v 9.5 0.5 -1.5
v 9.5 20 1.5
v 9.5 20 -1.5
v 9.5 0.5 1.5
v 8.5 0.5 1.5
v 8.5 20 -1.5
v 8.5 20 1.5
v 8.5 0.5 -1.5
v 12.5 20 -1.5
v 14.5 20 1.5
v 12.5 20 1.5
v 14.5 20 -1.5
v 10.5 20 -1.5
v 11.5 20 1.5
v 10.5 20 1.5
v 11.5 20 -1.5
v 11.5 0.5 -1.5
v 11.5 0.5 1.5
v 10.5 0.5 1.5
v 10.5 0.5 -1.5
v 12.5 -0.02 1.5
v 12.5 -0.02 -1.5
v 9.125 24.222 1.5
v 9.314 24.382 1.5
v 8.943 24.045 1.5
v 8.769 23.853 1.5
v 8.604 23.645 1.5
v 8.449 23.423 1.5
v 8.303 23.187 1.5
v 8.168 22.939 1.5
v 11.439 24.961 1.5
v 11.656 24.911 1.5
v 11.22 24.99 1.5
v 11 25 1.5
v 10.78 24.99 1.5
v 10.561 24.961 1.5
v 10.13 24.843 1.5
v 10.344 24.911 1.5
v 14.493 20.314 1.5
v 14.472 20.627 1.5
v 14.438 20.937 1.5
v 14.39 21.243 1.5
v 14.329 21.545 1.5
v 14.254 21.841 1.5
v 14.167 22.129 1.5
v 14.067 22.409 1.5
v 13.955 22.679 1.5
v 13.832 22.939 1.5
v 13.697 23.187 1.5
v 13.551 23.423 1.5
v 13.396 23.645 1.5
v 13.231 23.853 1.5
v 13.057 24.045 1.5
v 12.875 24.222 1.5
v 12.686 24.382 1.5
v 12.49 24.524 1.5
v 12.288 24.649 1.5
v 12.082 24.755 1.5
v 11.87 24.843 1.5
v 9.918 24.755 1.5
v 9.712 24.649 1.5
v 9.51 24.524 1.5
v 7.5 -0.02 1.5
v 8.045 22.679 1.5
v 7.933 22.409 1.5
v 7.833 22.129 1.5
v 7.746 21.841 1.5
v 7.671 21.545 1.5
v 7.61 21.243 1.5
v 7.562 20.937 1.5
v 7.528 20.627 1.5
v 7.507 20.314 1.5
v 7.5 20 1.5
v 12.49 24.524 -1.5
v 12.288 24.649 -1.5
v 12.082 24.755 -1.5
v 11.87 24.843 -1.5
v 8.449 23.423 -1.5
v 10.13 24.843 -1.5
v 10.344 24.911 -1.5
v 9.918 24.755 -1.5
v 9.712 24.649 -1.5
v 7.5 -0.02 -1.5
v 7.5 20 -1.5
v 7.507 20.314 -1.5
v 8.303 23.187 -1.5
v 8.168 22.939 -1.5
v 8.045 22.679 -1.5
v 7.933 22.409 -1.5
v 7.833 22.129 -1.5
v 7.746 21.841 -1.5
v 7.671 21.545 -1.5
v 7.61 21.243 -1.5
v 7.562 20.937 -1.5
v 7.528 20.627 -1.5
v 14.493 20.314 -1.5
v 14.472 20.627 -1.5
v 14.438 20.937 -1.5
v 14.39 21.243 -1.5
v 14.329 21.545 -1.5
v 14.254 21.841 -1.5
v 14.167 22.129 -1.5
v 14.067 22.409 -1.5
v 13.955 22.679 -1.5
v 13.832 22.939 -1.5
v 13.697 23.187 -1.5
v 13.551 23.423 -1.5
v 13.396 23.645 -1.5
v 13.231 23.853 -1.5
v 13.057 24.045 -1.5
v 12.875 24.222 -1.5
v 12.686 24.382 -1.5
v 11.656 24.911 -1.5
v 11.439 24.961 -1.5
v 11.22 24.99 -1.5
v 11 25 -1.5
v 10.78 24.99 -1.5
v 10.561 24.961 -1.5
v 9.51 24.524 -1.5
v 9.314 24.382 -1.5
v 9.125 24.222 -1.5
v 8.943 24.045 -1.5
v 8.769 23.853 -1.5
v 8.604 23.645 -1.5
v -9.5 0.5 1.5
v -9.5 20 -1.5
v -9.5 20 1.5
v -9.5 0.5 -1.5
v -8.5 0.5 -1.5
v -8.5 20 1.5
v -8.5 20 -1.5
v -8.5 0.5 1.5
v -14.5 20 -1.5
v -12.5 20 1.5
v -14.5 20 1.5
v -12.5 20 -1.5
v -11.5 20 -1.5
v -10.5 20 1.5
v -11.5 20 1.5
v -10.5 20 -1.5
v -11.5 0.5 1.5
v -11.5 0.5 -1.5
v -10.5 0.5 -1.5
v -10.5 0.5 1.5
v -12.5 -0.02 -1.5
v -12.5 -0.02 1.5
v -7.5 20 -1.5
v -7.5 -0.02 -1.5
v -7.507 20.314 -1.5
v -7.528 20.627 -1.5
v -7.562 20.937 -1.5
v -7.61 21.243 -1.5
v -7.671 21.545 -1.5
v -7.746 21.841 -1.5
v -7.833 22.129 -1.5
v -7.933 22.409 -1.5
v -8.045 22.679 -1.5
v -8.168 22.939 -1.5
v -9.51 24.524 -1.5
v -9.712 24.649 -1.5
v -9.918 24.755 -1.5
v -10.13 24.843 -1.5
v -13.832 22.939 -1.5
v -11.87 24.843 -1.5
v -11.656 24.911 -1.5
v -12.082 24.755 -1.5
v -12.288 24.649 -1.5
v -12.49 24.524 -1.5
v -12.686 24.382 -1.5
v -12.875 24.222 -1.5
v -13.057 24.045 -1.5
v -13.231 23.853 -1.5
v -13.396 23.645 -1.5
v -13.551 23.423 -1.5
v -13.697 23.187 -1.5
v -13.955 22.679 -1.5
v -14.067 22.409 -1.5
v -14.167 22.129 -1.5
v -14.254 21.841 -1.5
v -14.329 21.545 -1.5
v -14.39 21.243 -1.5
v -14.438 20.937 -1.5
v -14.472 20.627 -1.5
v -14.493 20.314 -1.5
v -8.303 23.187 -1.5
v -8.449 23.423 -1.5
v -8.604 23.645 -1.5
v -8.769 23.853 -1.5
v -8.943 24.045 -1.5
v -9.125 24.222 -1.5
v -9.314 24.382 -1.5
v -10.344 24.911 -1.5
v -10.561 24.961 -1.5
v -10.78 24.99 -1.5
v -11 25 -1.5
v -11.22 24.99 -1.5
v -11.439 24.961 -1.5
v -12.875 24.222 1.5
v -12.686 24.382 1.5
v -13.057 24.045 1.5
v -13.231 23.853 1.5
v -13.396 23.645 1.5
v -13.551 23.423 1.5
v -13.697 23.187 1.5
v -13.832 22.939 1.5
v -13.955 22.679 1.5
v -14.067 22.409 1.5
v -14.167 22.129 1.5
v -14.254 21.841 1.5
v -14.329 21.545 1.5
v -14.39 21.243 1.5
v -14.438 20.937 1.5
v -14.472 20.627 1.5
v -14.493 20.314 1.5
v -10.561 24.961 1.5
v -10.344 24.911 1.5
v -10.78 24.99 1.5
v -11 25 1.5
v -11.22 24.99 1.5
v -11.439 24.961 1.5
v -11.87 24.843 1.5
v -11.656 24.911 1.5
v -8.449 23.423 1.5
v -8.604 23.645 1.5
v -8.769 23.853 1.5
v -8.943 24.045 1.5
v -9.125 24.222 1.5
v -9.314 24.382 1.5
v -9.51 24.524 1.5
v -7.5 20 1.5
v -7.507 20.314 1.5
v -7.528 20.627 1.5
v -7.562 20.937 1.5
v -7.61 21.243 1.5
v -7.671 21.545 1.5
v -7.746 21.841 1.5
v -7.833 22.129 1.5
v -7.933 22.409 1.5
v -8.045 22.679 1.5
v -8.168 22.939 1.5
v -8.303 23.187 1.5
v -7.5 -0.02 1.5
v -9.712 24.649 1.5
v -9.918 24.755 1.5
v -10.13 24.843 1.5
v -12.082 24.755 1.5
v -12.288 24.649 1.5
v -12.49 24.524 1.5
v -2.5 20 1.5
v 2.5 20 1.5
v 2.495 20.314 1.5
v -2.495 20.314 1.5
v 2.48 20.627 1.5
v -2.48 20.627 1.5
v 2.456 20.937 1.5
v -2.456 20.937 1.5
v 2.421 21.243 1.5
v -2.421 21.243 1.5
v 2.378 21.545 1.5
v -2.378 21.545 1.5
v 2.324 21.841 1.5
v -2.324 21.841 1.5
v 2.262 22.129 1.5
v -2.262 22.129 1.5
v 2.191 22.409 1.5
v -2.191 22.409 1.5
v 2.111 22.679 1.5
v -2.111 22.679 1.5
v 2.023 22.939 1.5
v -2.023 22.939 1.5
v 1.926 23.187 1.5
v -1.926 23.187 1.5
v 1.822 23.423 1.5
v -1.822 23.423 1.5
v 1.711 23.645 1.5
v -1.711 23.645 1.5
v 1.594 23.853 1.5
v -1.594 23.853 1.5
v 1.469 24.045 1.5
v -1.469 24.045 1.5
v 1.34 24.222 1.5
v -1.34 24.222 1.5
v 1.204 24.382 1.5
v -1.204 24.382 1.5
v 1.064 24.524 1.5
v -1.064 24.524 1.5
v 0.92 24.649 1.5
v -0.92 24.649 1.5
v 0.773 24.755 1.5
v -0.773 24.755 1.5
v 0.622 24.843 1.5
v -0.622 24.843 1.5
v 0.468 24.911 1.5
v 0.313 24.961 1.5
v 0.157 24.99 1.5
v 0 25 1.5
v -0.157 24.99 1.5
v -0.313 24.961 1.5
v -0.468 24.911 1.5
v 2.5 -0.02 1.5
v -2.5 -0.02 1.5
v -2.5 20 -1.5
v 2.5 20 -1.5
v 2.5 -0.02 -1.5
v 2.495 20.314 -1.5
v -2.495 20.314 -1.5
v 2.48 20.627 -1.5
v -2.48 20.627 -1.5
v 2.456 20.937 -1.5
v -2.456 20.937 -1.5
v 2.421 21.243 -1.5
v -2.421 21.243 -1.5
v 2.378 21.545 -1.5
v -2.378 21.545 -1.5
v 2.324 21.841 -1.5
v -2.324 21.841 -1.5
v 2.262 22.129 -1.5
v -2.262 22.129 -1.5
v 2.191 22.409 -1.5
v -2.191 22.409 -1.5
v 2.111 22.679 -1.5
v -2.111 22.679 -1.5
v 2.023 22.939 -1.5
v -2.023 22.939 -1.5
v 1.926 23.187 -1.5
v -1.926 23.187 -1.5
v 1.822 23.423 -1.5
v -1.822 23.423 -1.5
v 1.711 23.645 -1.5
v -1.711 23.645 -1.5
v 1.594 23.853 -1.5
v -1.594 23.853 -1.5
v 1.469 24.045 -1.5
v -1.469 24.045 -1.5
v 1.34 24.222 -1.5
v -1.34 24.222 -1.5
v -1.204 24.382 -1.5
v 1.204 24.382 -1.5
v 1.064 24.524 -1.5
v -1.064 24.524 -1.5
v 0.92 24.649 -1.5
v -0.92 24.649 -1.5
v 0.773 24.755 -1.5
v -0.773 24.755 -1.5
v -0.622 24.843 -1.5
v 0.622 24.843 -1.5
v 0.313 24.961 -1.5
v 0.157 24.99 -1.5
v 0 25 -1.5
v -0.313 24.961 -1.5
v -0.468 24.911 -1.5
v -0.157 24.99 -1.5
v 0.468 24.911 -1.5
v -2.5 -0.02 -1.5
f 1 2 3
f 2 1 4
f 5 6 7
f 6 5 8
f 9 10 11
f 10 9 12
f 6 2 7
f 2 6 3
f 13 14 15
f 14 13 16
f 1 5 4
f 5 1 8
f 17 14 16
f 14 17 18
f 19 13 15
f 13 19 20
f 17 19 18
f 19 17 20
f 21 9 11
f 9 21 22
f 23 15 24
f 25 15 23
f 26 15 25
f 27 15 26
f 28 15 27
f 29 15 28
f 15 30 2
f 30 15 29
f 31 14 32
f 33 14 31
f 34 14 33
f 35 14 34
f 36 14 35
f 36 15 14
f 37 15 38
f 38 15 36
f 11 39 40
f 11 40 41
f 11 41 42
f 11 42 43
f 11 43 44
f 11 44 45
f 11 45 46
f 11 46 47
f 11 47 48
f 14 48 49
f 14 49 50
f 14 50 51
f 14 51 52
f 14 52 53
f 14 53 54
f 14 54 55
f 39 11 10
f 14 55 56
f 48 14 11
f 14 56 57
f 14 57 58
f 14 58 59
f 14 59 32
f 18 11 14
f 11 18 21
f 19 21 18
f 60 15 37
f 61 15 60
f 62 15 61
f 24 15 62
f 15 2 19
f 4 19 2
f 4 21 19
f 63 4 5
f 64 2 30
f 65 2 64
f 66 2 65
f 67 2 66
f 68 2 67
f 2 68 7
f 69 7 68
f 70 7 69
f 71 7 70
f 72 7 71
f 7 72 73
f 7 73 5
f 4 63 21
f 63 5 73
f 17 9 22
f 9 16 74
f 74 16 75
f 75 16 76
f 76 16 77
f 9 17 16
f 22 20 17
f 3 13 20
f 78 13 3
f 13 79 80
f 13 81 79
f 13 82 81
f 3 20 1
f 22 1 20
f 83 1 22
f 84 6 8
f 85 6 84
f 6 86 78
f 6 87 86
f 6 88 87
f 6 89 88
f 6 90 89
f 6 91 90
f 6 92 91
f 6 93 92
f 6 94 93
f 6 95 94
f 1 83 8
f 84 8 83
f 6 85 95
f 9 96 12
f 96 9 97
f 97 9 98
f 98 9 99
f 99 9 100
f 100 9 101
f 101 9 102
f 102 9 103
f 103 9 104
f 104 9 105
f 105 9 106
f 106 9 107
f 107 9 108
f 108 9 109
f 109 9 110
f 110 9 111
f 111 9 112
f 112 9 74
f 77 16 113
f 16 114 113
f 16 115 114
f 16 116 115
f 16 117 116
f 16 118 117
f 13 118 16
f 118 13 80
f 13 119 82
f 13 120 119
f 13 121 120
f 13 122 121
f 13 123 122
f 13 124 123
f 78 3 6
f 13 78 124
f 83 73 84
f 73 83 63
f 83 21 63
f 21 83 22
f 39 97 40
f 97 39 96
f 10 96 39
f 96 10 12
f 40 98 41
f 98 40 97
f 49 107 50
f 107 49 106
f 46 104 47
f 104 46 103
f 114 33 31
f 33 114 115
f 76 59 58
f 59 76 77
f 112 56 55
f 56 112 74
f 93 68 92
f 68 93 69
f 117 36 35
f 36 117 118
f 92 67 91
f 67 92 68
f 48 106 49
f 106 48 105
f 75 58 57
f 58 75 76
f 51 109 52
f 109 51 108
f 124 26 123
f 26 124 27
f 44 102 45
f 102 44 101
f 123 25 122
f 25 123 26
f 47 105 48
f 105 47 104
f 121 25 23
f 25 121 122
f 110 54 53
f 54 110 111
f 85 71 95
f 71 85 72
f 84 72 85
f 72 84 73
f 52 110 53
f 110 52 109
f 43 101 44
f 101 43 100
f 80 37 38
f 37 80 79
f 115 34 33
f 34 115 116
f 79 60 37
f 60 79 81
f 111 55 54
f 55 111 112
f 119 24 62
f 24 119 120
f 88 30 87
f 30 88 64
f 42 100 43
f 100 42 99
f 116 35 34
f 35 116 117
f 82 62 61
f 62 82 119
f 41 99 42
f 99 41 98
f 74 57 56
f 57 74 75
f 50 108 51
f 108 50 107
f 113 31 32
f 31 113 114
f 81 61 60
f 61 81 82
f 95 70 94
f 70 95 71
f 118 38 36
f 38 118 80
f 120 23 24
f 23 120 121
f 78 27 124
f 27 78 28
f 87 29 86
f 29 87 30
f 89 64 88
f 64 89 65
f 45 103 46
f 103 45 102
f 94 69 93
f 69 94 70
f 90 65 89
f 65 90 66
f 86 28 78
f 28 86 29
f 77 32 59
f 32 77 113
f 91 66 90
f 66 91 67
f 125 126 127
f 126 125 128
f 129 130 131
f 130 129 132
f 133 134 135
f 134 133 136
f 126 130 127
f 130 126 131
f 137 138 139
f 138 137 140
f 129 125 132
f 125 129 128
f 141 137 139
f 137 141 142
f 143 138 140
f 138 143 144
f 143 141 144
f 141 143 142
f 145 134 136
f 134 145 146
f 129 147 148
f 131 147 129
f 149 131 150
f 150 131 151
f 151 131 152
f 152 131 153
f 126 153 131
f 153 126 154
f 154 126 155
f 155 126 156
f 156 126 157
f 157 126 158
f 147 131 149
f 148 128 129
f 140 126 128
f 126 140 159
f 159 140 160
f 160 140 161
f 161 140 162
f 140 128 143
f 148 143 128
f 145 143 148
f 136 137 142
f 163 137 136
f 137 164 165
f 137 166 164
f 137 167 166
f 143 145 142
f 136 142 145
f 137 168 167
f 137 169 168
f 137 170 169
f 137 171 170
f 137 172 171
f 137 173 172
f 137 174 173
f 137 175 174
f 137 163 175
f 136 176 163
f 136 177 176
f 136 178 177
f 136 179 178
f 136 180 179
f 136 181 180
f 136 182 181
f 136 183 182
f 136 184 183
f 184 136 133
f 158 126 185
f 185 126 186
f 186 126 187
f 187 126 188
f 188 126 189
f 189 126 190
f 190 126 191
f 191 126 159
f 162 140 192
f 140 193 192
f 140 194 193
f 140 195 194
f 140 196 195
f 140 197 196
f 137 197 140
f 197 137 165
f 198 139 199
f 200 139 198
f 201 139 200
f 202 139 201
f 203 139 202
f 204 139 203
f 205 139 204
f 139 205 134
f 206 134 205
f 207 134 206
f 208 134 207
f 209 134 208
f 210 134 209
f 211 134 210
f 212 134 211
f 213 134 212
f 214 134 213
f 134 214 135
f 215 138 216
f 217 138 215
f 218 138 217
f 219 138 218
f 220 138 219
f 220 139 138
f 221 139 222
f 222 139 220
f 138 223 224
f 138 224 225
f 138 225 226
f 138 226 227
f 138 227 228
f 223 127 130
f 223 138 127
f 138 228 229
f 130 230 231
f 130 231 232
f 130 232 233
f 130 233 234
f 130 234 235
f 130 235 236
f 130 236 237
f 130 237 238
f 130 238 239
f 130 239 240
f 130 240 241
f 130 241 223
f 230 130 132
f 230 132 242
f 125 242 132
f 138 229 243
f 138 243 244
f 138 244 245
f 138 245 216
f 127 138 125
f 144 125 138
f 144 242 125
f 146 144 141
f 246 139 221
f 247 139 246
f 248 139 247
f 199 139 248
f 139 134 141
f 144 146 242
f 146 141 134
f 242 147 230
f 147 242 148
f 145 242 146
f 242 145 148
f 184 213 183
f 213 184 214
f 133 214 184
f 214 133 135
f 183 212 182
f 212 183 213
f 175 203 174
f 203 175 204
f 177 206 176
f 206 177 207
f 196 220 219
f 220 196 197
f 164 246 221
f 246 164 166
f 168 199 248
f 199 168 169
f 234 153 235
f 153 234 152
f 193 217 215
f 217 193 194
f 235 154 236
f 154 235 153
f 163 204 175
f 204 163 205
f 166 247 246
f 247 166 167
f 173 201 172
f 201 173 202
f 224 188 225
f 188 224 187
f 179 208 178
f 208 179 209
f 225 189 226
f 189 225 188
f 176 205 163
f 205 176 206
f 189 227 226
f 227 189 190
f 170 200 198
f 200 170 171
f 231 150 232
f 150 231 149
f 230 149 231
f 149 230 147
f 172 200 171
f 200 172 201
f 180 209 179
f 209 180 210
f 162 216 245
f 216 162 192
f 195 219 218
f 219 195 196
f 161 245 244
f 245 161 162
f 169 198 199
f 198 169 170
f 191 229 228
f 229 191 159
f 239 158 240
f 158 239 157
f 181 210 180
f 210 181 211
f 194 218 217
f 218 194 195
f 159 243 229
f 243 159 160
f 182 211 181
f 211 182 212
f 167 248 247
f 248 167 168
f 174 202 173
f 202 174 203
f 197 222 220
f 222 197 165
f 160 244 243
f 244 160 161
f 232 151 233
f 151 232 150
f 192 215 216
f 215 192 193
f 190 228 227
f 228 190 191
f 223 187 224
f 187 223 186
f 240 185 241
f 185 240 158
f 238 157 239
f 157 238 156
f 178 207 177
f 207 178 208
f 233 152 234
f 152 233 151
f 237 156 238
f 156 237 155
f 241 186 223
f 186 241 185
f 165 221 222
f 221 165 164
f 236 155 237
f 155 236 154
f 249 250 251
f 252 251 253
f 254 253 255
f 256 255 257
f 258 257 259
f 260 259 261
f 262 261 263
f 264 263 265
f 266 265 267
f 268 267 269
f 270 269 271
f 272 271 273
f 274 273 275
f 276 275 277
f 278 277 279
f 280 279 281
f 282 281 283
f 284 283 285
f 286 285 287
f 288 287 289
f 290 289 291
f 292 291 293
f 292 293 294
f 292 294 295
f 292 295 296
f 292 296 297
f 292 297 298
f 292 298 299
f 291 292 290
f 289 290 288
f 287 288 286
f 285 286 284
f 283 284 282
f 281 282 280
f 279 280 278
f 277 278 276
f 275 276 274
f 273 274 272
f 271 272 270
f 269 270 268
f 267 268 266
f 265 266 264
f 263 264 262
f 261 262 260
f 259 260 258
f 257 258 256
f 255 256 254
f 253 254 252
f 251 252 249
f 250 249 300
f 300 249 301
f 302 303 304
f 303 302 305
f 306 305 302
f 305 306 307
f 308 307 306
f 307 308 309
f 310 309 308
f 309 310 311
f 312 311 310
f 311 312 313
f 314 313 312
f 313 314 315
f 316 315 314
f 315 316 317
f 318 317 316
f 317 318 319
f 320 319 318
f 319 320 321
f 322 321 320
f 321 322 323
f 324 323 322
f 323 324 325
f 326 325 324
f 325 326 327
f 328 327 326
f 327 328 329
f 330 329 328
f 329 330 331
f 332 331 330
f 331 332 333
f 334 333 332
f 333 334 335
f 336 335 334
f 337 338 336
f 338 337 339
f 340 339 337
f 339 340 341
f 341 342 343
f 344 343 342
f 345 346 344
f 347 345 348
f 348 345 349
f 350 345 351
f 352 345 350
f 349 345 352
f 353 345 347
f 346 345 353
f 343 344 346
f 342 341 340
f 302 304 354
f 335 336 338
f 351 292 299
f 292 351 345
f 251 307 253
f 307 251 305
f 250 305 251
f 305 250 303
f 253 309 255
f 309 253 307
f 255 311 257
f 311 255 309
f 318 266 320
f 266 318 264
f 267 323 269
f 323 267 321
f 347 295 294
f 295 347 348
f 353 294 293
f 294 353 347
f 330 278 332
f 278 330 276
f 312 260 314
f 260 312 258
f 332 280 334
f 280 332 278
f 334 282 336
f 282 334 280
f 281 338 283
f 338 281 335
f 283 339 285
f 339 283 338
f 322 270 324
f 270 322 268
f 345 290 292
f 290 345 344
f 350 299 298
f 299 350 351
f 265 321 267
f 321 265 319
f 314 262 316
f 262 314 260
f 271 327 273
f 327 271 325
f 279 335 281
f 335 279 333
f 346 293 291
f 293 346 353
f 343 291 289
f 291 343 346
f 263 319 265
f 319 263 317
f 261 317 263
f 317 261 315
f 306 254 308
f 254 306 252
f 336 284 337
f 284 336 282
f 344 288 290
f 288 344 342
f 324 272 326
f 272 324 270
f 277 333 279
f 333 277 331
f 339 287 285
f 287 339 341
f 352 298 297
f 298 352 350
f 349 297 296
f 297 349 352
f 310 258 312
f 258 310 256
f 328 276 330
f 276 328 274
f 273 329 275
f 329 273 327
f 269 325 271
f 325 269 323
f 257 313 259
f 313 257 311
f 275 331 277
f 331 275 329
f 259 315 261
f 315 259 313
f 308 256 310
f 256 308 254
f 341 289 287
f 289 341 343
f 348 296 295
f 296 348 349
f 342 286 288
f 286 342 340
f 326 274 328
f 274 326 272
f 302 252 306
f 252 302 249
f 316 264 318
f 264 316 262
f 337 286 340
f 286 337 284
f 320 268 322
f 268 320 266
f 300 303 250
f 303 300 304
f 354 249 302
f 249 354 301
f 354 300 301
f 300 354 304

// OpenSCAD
// file: snap-feather.scad
include <config.scad>;


module snap_feather(
            width,
            height,
            hook_width,
            hook_height,
            hook_cutaway,
            leg_count=3,
            base_height
            )
{
    // feather leg(s)
    difference()
    {
        translate([
            width/2,
            (height-hook_height)/2 - nothing,
            0
            ])
        cube([
            width,
            height - hook_height + 2*nothing,
            material_z
            ], center=true);

        leg_width = width/(2*leg_count-1);
        leg_height = height - hook_height - base_height;
        for (i=[1:leg_count-1])
        {
            translate([
                leg_width/2 + (i*2-1)*leg_width,
                leg_height/2 + base_height,
                0
                ])
            cube([
                leg_width,
                leg_height,
                material_z + 2*nothing
                ], center=true);
        }
    }

    // feather head
    translate([0, height-hook_height, 0])
    intersection()
    {
        translate([0, 0, -material_z/2])
        cube([width+hook_width, hook_height, material_z]);

        translate([(width+hook_width)/2, 0, 0])
        scale([(width+hook_width)/2, hook_height, 1])
        cylinder(r=1, h=material_z, center=true);
    }
}

snap_feather(
    width=5,
    height=40,
    hook_width=3,
    hook_height=5,
    hook_cutaway=4,
    leg_width=2,
    leg_count=3,
    base_height=3
    );
// file: config.scad
$fn = 100;
nothing = 0.01;

material_z = 3;

snap_joint_width = 25;
snap_joint_height = 25;
snap_joint_feather_width = 5;
snap_joint_feather_hook_width = 2;
snap_joint_feather_hook_height = 5;
snap_joint_feather_hook_cutaway = 3;
snap_joint_feather_base_height = 0.5;
snap_joint_stick_width = 5;
// main file
include <config.scad>;
use <snap-feather.scad>;

module snap_joint(
            width = snap_joint_width,
            height = snap_joint_height,
            feather_width = snap_joint_feather_width,
            feather_hook_width = snap_joint_feather_hook_width,
            feather_hook_height = snap_joint_feather_hook_height,
            feather_hook_cutaway = snap_joint_feather_hook_cutaway,
            feather_base_height = snap_joint_feather_base_height,
            stick_width = snap_joint_stick_width
            )
{
    translate([width/2 - feather_width, 0, 0])
    snap_feather(
        width = feather_width,
        height = height,
        hook_width = feather_hook_width,
        hook_height = feather_hook_height,
        hook_cutaway  = feather_hook_cutaway,
        base_height = feather_base_height
        );

    translate([-width/2 + feather_width, 0, 0])
    rotate([0, 180, 0])
    snap_feather(
        width = feather_width,
        height = height,
        hook_width = feather_hook_width,
        hook_height = feather_hook_height,
        hook_cutaway  = feather_hook_cutaway,
        base_height = feather_base_height
        );

    translate([0, (height-feather_hook_height)/2 - nothing, 0])
    cube([stick_width, height - feather_hook_height + 2*nothing, material_z], center=true);

    translate([0, height-feather_hook_height, 0])
    intersection()
    {
        translate([0, feather_hook_height/2, 0])
        cube([stick_width, feather_hook_height, material_z], center=true);

        scale([stick_width/2, feather_hook_height, 1])
        cylinder(r=1, h=material_z, center=true);
    }
}

snap_joint();
